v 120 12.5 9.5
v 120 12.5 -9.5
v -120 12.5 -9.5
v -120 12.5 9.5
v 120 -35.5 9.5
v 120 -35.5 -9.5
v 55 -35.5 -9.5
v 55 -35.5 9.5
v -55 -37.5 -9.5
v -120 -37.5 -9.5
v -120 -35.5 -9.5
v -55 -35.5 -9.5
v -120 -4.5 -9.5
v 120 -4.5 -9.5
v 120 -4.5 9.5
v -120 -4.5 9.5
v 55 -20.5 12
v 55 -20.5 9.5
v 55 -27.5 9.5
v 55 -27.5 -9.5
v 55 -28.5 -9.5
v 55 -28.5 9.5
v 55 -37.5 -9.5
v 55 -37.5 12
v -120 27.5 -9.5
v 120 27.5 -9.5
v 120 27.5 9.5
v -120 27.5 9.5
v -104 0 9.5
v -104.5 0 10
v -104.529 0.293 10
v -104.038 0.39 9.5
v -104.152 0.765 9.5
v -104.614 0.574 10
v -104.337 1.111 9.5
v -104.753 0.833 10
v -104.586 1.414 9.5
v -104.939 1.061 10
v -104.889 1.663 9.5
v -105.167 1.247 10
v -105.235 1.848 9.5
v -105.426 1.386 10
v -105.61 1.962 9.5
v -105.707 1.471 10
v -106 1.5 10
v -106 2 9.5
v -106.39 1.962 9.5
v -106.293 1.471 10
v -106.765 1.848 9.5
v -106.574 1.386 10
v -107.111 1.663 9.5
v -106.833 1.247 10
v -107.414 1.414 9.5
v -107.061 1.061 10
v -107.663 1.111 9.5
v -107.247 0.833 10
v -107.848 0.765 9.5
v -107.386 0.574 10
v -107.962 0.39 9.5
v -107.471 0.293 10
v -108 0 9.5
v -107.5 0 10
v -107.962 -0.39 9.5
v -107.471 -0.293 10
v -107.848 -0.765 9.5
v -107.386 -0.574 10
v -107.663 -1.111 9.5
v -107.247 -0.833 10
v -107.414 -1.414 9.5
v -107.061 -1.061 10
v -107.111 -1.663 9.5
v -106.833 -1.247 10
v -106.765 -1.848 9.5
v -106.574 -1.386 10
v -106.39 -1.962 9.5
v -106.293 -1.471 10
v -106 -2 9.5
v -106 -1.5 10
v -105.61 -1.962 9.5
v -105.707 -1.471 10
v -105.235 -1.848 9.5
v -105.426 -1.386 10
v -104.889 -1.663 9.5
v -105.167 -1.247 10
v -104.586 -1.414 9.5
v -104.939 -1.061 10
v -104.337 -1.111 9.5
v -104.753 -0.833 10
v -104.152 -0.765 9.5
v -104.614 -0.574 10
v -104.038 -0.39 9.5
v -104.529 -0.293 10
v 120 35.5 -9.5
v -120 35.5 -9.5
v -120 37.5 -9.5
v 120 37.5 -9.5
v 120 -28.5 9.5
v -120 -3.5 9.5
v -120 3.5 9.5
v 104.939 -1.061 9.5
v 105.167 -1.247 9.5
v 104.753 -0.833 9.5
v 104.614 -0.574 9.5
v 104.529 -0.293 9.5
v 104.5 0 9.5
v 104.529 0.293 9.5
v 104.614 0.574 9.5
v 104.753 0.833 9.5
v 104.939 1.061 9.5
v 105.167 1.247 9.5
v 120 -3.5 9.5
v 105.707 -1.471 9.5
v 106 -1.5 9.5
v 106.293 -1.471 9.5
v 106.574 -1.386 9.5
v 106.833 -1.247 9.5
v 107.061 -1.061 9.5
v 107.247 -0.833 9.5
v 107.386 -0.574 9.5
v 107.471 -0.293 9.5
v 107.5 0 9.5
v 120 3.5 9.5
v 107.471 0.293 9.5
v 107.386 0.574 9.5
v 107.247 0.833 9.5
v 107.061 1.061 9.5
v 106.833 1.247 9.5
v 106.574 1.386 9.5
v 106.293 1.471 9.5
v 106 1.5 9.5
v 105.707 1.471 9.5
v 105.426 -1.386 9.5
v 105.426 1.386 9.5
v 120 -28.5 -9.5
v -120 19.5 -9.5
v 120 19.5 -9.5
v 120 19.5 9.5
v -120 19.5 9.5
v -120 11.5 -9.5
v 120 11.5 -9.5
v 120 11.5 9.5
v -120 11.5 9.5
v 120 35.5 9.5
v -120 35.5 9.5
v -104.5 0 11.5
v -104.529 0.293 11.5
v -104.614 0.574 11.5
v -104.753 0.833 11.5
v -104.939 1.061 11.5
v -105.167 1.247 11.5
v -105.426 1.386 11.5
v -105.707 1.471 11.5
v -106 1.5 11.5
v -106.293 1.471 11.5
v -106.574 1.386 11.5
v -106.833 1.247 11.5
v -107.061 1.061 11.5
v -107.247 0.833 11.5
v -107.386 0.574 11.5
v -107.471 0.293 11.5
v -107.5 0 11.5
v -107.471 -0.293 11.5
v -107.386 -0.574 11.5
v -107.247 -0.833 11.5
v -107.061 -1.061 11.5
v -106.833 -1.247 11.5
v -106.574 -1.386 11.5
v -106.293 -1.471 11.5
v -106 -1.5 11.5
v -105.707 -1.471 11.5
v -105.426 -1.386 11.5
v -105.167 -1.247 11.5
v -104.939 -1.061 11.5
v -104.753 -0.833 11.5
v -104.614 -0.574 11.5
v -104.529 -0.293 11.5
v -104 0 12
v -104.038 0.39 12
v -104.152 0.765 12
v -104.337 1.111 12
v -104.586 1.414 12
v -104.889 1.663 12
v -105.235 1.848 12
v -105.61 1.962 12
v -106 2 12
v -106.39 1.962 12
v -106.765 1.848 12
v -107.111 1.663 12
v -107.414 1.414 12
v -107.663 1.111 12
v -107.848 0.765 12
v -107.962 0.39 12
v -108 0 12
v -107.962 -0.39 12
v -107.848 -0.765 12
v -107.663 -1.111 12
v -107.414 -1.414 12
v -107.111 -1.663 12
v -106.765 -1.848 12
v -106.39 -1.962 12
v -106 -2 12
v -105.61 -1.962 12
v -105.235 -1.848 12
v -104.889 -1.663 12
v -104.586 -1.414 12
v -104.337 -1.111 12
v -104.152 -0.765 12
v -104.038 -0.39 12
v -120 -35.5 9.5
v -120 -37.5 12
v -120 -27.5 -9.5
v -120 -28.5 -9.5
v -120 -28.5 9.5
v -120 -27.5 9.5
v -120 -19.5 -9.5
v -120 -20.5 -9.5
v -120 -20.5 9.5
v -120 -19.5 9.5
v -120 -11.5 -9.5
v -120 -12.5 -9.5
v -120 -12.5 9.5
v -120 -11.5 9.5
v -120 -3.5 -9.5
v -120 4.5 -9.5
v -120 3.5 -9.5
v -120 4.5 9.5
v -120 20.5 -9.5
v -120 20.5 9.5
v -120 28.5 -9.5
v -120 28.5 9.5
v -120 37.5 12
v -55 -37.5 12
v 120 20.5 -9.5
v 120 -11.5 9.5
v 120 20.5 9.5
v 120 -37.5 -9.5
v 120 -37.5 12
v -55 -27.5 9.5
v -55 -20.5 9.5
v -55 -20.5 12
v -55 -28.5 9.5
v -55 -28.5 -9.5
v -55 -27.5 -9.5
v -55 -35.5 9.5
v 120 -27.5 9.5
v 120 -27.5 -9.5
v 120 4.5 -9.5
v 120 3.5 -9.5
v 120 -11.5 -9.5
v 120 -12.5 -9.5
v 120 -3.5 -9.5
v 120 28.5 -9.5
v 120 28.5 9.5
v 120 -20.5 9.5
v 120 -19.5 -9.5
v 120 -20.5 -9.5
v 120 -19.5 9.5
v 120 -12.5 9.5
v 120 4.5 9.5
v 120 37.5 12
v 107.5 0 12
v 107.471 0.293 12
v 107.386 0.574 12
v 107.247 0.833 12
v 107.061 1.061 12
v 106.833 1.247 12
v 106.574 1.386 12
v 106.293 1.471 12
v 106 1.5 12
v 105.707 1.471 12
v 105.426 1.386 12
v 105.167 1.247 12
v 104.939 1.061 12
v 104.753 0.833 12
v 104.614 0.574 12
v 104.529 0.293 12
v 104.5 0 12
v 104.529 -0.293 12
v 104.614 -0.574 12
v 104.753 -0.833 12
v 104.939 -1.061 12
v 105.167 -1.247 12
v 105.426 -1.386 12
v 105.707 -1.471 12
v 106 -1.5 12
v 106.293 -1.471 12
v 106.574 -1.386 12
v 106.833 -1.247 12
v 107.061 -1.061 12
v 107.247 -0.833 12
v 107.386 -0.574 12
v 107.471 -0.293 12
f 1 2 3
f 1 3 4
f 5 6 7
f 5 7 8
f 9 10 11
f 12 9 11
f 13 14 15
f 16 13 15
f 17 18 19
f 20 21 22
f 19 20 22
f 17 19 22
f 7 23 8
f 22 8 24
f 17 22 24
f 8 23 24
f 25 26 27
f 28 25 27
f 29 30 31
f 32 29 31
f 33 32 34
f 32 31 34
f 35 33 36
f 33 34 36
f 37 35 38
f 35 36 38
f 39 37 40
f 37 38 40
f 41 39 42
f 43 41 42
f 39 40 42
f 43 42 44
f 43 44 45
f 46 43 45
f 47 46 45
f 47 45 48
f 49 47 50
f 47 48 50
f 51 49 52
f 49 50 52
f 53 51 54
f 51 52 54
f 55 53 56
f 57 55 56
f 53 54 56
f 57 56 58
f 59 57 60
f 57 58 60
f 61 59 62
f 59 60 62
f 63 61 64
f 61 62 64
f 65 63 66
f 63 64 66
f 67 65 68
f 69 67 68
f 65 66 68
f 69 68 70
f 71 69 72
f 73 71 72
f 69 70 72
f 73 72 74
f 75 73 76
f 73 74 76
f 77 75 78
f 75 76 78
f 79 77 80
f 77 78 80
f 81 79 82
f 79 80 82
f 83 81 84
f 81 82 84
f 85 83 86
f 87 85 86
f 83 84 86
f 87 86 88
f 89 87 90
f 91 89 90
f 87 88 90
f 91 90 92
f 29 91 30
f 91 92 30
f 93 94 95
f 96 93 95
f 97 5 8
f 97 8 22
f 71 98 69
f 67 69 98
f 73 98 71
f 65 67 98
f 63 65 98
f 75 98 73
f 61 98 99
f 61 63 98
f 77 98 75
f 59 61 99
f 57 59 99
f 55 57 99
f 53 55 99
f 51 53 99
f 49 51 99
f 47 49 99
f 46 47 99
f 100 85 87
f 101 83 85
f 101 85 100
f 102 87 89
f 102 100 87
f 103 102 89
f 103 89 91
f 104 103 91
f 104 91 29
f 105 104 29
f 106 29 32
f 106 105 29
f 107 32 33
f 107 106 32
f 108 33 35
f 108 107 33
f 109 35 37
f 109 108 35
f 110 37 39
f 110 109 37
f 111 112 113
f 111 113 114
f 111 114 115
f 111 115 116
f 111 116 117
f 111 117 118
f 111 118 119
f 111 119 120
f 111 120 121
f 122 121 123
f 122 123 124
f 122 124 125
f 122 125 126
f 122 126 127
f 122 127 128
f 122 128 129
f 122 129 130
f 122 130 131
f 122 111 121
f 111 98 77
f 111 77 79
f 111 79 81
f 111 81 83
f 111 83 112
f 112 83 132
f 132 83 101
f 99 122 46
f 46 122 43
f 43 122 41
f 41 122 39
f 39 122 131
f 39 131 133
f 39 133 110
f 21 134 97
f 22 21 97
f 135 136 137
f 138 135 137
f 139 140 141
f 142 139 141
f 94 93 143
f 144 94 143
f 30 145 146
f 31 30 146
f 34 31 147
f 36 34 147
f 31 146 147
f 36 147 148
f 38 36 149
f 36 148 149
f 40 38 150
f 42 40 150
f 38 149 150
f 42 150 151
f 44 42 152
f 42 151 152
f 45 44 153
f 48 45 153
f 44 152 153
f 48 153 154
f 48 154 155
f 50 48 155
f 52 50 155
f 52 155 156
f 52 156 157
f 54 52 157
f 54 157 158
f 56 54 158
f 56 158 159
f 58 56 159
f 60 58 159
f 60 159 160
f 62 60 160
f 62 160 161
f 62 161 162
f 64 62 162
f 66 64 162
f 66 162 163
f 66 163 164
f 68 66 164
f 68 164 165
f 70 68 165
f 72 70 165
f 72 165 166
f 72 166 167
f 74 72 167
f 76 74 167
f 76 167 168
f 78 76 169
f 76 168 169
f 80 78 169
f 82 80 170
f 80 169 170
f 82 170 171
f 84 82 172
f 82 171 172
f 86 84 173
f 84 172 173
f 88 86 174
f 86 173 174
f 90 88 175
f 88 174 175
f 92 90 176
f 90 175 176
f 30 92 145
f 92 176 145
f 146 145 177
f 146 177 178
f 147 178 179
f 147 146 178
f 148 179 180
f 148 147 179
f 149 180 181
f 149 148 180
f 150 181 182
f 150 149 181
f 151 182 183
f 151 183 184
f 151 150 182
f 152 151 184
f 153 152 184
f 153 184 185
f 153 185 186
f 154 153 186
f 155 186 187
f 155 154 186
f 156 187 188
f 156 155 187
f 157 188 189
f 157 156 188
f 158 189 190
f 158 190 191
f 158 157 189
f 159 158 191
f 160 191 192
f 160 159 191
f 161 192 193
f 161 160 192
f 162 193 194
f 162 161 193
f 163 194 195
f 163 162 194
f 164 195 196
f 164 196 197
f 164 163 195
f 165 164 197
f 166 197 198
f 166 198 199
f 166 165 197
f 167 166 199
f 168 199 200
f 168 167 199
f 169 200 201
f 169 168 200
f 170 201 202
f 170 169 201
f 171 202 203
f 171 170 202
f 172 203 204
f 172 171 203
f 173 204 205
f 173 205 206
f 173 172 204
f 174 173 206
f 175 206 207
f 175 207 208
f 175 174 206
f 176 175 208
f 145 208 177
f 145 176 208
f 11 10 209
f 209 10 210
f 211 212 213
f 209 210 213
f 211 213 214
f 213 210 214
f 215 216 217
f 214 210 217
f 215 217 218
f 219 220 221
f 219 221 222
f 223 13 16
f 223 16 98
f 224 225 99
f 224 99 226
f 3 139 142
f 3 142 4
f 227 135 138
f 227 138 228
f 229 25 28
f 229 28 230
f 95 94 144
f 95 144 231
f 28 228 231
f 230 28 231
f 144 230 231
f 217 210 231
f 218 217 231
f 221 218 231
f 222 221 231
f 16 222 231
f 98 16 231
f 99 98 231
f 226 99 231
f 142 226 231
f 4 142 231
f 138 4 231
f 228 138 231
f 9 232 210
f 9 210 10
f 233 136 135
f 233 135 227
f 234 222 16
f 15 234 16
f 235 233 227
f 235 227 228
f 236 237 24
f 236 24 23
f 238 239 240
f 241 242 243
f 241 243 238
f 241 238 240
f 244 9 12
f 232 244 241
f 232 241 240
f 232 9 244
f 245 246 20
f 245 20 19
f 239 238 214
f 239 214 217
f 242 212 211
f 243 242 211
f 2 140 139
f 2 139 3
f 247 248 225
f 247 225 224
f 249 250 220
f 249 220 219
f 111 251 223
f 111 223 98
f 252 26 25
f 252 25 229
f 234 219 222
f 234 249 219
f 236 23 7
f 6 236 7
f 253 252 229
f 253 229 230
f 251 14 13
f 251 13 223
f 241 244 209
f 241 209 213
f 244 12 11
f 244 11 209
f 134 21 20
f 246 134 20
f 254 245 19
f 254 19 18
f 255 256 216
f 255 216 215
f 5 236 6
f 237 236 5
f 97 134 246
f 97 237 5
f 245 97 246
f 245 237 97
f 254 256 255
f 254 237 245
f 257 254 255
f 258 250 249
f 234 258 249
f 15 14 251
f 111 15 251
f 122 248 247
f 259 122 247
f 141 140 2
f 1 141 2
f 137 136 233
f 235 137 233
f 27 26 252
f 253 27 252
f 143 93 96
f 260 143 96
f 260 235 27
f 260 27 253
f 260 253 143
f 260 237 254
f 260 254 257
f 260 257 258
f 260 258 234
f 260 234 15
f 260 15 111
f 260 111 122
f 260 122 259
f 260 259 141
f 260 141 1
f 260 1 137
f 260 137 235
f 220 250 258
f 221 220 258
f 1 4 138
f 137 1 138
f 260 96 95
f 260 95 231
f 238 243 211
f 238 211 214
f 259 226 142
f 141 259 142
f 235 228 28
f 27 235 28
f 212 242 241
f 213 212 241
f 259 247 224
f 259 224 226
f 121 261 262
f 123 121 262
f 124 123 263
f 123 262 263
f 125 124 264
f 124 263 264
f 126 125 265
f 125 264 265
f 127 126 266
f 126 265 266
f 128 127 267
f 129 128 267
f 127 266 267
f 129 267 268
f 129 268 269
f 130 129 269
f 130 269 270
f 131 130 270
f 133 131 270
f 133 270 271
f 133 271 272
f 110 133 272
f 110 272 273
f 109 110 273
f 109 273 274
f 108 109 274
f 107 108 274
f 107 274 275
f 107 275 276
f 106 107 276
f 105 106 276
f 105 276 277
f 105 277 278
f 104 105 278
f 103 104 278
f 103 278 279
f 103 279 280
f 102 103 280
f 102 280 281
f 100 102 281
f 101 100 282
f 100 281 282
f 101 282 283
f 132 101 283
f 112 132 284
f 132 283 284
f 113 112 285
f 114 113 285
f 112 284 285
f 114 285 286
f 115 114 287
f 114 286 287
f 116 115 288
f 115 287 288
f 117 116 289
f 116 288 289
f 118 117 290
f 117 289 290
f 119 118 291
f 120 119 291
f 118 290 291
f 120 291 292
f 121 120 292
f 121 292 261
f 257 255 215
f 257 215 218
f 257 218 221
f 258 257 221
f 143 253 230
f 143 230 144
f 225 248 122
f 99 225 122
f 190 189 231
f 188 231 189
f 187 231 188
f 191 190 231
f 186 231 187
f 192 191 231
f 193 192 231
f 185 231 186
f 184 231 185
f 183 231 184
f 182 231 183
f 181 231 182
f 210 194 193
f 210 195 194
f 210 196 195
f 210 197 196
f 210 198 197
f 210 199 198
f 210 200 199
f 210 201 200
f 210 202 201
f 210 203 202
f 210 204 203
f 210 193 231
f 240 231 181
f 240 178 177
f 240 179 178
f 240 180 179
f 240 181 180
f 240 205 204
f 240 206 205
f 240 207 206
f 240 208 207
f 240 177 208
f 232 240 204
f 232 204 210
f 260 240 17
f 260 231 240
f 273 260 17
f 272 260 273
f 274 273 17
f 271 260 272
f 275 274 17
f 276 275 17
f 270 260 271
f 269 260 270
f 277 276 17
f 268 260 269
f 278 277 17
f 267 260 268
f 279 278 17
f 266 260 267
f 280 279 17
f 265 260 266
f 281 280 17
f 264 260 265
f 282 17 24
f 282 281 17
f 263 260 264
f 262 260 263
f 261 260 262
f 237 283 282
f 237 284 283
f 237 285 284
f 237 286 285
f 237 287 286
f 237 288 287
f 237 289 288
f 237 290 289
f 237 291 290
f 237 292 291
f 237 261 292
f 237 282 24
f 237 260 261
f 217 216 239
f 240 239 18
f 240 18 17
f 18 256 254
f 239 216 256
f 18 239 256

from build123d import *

# Parameters (mm, degrees)
F0_W     = 1
F0_H     = 19
F0_W_2   = 2
F1_DEPTH = 120
F2_R     = 1.5
F3_DEPTH = 21.501
F4_SIZE  = 0.5
F5_W     = 110
F5_H     = 21.5
F6_DEPTH = 17


with BuildPart() as f1:
    # F0 (on Right) → F1 (new body, symmetric)
    with BuildSketch(Plane.YZ):
        with Locations((-4, 0)):
            Rectangle(F0_W, F0_H)
        with Locations((4, 0)):
            Rectangle(F0_W, F0_H)
        with Locations((-12, 0)):
            Rectangle(F0_W, F0_H)
        with Locations((-20, 0)):
            Rectangle(F0_W, F0_H)
        with Locations((12, 0)):
            Rectangle(F0_W, F0_H)
        with Locations((20, 0)):
            Rectangle(F0_W, F0_H)
        with Locations((28, 0)):
            Rectangle(F0_W, F0_H)
        with Locations((-28, 0)):
            Rectangle(F0_W, F0_H)
        with Locations((36.5, 0)):
            Rectangle(F0_W_2, F0_H)
        with Locations((-36.5, 0)):
            Rectangle(F0_W_2, F0_H)
        Polygon((-11.5, 9.5), (-4.5, 9.5), (-3.5, 9.5), (3.5, 9.5), (4.5, 9.5), (11.5, 9.5), (12.5, 9.5), (19.5, 9.5), (20.5, 9.5), (27.5, 9.5), (28.5, 9.5), (35.5, 9.5), (37.5, 9.5), (37.5, 12), (-37.5, 12), (-37.5, 9.5), (-35.5, 9.5), (-28.5, 9.5), (-27.5, 9.5), (-20.5, 9.5), (-19.5, 9.5), (-12.5, 9.5), align=None)
    extrude(amount=F1_DEPTH, both=True)

    # F2 (on face) → F3 (cut, through all)
    with BuildSketch(Plane.XY.offset(12)):
        with Locations((-106, 0)):
            Circle(F2_R)
        with Locations((106, 0)):
            Circle(F2_R)
    extrude(amount=-F3_DEPTH, mode=Mode.SUBTRACT)

    # F4
    f4_edges = [f1.edges().sort_by_distance(p)[0] for p in [
        (-107.5, 0, 12),
        (-104.5, 0, 10.75),
        (-107.5, 0, 9.5),
    ]]
    chamfer(f4_edges, length=F4_SIZE)

    # F5 (on face) → F6 (cut)
    with BuildSketch(Plane.XZ.offset(37.5)):
        with Locations((0, 1.25)):
            Rectangle(F5_W, F5_H)
    extrude(amount=-F6_DEPTH, mode=Mode.SUBTRACT)


solid = f1.part
